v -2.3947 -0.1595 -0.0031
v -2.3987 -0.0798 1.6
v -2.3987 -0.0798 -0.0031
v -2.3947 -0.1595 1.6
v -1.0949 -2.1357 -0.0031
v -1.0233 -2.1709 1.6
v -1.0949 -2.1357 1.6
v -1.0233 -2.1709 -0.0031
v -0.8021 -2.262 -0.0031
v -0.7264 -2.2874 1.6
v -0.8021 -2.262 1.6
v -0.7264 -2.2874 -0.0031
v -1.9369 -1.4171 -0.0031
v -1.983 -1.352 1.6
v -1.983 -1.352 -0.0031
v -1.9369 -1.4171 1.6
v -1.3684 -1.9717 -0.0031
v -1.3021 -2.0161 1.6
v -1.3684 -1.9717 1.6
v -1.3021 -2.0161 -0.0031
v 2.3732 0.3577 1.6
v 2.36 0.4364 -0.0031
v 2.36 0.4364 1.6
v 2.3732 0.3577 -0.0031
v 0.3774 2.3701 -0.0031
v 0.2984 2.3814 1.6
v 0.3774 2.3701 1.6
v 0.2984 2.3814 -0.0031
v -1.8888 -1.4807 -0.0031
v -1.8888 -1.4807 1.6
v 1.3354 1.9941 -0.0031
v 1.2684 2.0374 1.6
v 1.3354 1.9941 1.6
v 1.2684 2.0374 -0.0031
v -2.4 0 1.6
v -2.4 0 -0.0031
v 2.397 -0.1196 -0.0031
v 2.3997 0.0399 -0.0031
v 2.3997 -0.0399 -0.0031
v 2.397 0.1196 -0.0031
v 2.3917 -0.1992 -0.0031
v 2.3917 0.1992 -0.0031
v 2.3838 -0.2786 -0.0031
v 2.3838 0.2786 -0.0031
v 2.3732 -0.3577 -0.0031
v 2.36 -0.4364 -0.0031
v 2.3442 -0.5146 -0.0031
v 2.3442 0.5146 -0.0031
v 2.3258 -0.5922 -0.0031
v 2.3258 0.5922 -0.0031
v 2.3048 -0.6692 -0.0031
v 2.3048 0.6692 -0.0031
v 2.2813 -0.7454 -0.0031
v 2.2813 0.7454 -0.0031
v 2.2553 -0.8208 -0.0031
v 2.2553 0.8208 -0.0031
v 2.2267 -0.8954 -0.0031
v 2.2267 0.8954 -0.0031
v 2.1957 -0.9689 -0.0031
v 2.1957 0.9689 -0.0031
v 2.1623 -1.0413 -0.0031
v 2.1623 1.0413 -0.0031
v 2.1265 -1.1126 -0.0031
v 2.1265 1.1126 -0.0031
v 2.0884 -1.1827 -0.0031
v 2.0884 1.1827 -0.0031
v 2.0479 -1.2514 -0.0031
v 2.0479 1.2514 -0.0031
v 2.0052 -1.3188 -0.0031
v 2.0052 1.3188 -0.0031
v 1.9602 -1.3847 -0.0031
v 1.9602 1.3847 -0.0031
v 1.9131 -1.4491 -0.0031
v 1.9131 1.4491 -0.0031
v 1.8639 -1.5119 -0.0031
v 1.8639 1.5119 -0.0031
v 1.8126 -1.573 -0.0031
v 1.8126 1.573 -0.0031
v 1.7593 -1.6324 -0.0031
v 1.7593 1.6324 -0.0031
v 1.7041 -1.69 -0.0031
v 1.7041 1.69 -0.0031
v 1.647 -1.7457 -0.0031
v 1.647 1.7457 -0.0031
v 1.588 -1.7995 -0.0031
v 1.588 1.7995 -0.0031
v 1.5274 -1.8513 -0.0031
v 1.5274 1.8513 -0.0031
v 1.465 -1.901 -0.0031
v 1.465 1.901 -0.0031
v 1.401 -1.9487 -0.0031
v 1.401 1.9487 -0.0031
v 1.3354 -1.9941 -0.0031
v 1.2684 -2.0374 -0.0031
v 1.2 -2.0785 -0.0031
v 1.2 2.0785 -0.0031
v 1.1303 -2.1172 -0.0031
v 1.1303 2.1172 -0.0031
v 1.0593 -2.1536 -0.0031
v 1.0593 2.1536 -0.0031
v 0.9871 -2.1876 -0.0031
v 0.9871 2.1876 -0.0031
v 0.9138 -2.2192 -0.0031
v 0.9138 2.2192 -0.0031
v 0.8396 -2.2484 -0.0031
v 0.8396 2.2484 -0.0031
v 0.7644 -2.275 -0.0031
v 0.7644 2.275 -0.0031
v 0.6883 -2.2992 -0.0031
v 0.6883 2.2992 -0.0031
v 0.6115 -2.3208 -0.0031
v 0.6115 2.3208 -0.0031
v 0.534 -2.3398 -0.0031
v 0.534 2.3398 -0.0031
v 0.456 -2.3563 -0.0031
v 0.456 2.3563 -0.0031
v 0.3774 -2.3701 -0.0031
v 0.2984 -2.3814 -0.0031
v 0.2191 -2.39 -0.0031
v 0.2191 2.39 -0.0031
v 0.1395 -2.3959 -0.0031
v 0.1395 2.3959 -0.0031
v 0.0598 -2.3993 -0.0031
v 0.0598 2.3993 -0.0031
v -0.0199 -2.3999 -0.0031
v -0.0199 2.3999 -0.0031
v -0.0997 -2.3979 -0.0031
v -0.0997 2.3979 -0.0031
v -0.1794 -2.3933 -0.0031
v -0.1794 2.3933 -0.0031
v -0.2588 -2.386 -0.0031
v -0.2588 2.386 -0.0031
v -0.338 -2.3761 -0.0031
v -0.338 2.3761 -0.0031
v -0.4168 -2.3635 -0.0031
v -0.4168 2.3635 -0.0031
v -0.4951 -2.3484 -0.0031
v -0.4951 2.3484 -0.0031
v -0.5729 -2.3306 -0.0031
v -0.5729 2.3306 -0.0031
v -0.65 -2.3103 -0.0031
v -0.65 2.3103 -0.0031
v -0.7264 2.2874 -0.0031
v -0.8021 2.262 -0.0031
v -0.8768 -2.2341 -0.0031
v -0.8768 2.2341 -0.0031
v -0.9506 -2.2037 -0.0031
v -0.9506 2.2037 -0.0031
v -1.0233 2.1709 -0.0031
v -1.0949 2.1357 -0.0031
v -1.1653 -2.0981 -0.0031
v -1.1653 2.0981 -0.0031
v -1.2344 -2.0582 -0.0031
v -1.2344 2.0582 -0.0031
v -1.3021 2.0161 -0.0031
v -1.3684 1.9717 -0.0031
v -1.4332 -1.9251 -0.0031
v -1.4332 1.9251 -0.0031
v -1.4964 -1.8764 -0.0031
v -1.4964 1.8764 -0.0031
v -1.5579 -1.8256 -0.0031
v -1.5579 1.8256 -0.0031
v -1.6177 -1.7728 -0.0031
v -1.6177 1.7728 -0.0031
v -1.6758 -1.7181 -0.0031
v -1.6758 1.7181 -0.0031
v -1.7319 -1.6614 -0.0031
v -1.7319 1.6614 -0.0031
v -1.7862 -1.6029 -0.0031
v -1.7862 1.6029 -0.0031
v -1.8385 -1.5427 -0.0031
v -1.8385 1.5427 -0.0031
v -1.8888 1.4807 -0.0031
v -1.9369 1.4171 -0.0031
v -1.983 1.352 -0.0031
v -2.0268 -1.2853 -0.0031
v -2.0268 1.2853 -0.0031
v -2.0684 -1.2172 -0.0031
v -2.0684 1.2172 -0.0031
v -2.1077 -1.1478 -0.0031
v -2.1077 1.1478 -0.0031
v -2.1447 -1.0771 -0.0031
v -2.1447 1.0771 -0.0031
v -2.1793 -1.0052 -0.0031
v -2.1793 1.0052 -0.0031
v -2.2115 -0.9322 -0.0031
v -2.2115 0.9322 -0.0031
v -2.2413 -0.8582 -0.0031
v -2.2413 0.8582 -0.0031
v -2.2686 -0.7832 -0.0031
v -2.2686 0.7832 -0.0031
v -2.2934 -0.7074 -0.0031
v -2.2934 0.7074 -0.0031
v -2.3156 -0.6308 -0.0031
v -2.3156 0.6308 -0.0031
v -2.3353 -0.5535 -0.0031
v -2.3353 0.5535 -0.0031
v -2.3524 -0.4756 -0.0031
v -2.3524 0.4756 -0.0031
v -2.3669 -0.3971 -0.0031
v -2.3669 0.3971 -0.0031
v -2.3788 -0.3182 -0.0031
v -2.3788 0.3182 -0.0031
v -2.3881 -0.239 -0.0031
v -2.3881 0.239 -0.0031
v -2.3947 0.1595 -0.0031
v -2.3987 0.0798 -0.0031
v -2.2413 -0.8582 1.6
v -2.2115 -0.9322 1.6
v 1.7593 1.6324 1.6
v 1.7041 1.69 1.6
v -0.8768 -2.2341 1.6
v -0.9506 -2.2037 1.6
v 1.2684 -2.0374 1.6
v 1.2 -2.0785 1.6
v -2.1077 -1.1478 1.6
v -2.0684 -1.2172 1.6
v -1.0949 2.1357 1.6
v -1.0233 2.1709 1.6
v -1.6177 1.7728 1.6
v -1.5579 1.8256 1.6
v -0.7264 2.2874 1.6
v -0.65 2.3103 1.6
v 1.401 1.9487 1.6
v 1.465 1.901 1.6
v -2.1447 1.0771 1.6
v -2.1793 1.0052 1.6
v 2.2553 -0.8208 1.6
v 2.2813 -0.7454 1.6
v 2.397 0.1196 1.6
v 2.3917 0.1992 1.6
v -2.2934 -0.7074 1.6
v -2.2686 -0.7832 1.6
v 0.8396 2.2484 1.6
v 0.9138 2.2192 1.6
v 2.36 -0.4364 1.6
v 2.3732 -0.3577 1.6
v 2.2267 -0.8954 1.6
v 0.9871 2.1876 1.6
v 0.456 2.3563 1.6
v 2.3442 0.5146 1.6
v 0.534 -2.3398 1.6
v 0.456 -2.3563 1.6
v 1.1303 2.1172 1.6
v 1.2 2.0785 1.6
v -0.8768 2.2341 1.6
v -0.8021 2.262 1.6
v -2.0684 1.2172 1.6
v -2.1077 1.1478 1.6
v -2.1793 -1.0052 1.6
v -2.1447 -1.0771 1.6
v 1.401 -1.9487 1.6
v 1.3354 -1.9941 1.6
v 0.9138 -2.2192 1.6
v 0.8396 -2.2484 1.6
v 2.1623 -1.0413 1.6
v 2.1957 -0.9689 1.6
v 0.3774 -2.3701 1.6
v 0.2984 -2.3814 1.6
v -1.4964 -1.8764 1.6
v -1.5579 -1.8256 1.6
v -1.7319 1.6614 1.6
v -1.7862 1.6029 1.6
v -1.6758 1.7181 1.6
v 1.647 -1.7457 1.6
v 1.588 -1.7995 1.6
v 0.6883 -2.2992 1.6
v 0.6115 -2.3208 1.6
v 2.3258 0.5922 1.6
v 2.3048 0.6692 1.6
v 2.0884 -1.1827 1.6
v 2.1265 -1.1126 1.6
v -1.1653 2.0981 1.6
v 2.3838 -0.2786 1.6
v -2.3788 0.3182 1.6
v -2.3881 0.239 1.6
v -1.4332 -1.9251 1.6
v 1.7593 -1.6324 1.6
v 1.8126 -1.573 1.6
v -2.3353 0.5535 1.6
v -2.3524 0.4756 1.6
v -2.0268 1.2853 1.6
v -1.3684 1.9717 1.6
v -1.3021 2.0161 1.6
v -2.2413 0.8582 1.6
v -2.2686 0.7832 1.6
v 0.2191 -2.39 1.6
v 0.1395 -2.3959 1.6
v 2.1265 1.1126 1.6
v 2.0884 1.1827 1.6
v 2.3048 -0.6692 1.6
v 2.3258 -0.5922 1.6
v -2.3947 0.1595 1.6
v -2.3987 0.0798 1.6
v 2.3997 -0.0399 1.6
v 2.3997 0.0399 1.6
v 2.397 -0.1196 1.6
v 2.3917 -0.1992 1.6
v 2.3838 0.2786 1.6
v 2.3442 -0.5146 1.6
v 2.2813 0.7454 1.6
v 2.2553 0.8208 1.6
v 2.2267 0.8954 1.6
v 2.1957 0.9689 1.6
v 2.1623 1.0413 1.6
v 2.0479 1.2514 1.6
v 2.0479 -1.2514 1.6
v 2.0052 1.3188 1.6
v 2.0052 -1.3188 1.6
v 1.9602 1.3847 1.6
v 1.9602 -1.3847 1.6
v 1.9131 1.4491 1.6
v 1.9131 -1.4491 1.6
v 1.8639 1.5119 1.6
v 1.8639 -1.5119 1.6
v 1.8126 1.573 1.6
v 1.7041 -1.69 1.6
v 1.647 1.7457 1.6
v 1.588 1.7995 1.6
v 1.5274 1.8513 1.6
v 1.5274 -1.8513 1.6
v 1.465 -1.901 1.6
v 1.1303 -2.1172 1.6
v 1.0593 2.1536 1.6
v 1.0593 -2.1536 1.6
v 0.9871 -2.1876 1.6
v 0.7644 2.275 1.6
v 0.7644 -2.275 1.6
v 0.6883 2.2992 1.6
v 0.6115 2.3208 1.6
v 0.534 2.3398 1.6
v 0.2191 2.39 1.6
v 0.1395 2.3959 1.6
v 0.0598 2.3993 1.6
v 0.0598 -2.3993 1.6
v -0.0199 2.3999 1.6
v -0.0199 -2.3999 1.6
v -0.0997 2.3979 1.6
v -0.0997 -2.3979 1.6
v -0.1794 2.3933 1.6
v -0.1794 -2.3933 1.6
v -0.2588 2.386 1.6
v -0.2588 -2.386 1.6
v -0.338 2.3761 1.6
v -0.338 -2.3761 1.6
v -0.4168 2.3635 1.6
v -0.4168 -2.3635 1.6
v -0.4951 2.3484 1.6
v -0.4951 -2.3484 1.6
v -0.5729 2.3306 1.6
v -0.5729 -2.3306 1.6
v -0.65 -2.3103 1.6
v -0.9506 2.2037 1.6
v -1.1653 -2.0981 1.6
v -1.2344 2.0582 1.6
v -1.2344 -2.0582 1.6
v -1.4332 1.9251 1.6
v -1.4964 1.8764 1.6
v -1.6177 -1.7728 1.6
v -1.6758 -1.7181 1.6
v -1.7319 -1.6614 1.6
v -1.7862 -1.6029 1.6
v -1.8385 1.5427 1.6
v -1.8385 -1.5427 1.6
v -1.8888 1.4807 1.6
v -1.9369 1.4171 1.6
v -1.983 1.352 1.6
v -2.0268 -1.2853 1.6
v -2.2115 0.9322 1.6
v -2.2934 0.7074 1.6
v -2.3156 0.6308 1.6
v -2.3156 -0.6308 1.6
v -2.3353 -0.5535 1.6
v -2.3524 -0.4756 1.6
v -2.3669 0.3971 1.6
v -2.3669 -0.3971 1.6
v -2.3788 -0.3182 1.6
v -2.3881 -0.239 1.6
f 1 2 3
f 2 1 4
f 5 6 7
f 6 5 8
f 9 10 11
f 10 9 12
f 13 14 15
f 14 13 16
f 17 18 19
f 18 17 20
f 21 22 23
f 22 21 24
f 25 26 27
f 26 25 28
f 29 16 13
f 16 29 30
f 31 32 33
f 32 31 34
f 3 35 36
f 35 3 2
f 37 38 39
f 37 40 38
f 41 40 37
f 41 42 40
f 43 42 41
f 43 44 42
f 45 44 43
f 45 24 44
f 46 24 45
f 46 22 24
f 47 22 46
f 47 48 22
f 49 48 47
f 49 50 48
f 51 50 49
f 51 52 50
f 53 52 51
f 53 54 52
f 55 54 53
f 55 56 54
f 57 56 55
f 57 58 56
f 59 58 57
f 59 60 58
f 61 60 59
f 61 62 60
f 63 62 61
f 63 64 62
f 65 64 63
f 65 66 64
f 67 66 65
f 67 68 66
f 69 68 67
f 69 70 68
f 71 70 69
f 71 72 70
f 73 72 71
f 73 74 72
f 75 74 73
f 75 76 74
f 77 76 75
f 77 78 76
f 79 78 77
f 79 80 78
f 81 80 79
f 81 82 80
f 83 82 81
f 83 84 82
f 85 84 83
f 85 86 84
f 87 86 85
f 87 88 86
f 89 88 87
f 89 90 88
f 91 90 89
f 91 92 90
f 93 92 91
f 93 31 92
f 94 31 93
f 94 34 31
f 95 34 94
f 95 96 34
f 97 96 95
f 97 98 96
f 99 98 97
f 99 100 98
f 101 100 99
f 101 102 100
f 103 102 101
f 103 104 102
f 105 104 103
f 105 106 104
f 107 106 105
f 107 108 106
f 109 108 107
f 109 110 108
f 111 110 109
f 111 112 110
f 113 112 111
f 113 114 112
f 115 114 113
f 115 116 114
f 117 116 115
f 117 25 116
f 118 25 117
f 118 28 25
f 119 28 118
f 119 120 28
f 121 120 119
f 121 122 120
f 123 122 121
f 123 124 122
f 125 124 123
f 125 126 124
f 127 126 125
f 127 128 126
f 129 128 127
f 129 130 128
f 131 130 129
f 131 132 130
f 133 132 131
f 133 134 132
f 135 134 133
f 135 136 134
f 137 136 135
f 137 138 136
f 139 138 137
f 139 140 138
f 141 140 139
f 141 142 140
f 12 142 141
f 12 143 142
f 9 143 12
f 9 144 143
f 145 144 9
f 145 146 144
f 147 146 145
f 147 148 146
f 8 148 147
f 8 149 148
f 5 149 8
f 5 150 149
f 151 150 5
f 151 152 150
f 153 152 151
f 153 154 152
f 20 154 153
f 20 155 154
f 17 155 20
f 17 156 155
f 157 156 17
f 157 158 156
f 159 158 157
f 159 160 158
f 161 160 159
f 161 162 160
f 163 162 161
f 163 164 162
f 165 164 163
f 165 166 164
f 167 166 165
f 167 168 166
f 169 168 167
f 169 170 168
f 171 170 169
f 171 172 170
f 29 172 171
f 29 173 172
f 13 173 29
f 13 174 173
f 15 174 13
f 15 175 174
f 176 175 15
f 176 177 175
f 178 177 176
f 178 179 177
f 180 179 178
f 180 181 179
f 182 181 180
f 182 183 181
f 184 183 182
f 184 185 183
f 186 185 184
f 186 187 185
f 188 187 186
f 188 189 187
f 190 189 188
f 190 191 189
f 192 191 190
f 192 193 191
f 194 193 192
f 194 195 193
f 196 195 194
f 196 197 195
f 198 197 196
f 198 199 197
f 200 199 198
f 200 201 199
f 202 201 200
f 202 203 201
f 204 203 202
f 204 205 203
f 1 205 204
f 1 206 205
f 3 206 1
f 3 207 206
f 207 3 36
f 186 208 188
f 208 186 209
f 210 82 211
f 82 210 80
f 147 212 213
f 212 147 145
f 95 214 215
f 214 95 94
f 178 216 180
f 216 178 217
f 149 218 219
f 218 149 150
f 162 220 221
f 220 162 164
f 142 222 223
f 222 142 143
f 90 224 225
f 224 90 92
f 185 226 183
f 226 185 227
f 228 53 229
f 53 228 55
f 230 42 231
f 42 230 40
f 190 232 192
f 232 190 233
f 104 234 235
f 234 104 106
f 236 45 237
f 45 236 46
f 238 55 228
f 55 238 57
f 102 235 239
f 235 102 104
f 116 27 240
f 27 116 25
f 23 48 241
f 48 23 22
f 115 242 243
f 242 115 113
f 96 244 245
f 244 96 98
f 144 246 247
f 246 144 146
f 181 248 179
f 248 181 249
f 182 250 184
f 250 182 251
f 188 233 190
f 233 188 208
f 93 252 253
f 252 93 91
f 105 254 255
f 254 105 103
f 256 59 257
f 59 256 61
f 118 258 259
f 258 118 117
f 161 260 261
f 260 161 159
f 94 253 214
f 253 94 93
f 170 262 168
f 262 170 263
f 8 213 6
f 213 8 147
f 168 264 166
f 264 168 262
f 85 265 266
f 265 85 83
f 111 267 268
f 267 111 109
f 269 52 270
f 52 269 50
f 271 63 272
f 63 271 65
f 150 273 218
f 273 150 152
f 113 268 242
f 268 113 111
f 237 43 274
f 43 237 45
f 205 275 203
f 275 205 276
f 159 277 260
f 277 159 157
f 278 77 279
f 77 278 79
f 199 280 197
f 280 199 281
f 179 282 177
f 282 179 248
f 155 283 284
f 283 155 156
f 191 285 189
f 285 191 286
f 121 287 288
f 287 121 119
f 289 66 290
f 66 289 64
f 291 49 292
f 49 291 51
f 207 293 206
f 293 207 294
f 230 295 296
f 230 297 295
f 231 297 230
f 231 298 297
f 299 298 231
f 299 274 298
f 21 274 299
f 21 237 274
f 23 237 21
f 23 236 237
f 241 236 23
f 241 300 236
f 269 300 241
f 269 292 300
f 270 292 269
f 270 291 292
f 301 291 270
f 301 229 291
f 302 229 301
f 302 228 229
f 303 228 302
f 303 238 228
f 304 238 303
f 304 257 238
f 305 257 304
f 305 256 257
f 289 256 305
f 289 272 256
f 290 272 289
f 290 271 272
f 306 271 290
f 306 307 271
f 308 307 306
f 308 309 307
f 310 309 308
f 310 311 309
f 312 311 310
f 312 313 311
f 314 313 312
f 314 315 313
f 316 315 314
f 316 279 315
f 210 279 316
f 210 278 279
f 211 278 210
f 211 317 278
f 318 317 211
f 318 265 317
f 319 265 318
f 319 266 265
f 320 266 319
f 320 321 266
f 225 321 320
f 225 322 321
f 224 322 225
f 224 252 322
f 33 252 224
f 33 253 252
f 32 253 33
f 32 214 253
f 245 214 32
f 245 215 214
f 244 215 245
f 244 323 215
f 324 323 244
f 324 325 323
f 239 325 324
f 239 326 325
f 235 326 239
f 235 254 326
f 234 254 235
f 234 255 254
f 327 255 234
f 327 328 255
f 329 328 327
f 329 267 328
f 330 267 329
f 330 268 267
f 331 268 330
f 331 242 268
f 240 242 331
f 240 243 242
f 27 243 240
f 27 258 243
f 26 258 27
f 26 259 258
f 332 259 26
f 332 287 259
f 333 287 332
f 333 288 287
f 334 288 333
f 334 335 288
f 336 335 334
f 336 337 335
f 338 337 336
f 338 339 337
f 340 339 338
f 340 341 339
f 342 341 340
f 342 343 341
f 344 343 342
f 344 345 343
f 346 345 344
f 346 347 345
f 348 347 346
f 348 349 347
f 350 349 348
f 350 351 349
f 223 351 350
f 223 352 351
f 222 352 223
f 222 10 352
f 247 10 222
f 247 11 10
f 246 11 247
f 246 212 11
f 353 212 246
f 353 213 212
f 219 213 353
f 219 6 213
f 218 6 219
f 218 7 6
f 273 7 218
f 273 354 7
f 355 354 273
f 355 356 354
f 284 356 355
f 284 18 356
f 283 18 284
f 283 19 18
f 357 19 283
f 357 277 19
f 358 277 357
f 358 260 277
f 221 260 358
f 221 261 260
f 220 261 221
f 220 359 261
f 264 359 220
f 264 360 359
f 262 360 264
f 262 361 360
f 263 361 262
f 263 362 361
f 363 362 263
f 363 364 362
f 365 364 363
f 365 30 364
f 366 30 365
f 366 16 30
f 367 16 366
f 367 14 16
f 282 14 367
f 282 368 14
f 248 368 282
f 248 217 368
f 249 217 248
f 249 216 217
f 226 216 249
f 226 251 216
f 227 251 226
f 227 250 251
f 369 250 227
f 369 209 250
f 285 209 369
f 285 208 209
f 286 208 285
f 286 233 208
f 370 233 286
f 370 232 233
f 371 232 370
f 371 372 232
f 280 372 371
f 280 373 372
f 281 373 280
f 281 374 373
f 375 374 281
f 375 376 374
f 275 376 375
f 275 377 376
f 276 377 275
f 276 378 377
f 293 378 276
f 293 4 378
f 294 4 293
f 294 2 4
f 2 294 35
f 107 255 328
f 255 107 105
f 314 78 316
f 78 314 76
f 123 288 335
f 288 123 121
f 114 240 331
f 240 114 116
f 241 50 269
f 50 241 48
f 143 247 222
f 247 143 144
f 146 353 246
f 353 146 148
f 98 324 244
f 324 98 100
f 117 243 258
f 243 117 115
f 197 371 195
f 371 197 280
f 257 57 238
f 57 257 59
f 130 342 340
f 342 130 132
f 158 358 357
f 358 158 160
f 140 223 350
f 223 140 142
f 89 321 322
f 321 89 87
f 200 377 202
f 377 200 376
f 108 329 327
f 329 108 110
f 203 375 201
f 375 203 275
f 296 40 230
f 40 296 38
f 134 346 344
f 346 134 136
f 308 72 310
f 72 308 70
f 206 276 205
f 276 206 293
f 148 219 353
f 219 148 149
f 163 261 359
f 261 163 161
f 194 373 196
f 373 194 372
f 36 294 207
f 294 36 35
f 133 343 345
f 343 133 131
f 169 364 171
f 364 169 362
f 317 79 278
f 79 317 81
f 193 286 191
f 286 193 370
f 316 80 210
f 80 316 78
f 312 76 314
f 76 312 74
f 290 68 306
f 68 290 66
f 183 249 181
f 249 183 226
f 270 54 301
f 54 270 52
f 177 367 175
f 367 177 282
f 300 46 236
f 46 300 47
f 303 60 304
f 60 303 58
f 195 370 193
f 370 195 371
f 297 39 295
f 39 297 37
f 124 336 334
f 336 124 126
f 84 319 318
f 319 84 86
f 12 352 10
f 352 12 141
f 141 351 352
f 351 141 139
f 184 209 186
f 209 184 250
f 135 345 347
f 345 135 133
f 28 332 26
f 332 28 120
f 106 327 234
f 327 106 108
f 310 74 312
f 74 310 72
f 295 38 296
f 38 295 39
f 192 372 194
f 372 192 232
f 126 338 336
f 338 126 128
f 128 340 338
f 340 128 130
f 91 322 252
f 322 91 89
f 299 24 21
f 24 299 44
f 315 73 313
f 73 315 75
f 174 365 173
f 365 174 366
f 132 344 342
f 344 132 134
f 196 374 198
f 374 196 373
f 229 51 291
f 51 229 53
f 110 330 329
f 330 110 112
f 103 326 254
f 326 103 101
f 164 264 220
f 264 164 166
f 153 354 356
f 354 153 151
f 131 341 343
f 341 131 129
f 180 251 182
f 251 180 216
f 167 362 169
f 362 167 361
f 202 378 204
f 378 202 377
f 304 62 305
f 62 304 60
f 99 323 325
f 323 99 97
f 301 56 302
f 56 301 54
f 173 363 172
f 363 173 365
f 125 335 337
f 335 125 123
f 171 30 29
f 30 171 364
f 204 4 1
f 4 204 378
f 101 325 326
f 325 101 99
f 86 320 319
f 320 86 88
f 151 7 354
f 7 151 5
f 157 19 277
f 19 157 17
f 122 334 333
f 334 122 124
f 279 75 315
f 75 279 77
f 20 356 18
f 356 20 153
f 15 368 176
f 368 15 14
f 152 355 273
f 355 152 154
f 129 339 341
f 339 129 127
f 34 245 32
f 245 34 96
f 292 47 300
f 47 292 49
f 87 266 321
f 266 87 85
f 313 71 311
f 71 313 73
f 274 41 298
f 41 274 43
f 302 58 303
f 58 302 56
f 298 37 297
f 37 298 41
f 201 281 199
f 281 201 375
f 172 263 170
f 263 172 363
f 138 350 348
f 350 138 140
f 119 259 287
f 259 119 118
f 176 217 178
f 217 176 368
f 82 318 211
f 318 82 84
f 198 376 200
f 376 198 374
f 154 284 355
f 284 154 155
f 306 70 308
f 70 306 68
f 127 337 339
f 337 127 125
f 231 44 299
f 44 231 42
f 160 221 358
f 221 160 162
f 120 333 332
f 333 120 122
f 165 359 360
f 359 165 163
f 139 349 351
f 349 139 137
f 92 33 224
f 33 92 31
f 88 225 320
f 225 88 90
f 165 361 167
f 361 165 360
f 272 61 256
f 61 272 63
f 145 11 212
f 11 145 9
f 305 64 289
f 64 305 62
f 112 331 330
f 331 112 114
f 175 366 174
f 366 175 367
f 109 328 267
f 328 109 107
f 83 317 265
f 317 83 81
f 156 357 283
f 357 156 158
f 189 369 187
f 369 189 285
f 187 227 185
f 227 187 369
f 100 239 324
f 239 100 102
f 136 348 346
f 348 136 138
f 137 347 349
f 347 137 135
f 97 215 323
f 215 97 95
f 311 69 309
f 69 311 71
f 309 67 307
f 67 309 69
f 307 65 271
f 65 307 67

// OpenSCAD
// file: ../p/stud3.scad
use <../lib.scad>
use <4-4cyli.scad>
use <4-4disc.scad>
use <4-4edge.scad>
$fa=1; $fs=0.2;
function ldraw_lib__stud3(realsolid=false) = realsolid ? 
    [openscad(translate([0,0,-eps()], o=cylinder(4+eps(), r=4)),2)] : [
// 0 Stud Tube Solid
// 0 Name: stud3.dat
// 0 Author: James Jessiman
// 0 !LDRAW_ORG Primitive UPDATE 2012-01
// 0 !LICENSE Licensed under CC BY 2.0 and CC BY 4.0 : see CAreadme.txt
// 
// 0 BFC CERTIFY CCW
  [0,"BFC","CERTIFY"],
  [0,"BFC","CCW"],
// 
// 0 !HISTORY 2002-04-04 [sbliss] Modified for BFC compliance
// 0 !HISTORY 2002-04-25 [PTadmin] Official Update 2002-02
// 0 !HISTORY 2007-06-24 [PTadmin] Header formatted for Contributor Agreement
// 0 !HISTORY 2008-07-01 [PTadmin] Official Update 2008-01
// 0 !HISTORY 2012-02-16 [Philo] Changed to CCW
// 0 !HISTORY 2012-03-30 [PTadmin] Official Update 2012-01
// 
// 
// 1 16 0 -4 0 4 0 0 0 1 0 0 0 4 4-4edge.dat
  [1,16,0,-4,0,4,0,0,0,1,0,0,0,4, ldraw_lib__4_4edge(realsolid)],
// 1 16 0 0 0 4 0 0 0 1 0 0 0 4 4-4edge.dat
  [1,16,0,0,0,4,0,0,0,1,0,0,0,4, ldraw_lib__4_4edge(realsolid)],
// 1 16 0 -4 0 4 0 0 0 1 0 0 0 4 4-4disc.dat
  [1,16,0,-4,0,4,0,0,0,1,0,0,0,4, ldraw_lib__4_4disc(realsolid)],
// 1 16 0 -4 0 4 0 0 0 4 0 0 0 4 4-4cyli.dat
  [1,16,0,-4,0,4,0,0,0,4,0,0,0,4, ldraw_lib__4_4cyli(realsolid)],
];
module ldraw_lib__stud3(step=0, col=false, unit=2/5, alt=false, line=0.2, solid=!$preview)
    makepoly(ldraw_lib__stud3(solid), step=step, col=col, unit=unit, alt=alt, line=line, solid=solid);
ldraw_lib__stud3(line=0.2);
// file: ../p/4-4edge.scad
use <../lib.scad>
$fa=1; $fs=0.2;
function ldraw_lib__4_4edge(realsolid=false) = [
// 0 Circle 1.0
// 0 Name: 4-4edge.dat
// 0 Author: James Jessiman
// 0 !LDRAW_ORG Primitive UPDATE 2017-01
// 0 !LICENSE Licensed under CC BY 2.0 and CC BY 4.0 : see CAreadme.txt
// 
// 0 BFC CERTIFY CCW
  [0,"BFC","CERTIFY"],
  [0,"BFC","CCW"],
// 
// 0 !HISTORY 1998-12-15 [PTadmin] Official Update 1998-10
// 0 !HISTORY 2005-12-28 [PTadmin] Official Update 2005-01
// 0 !HISTORY 2007-06-24 [PTadmin] Header formatted for Contributor Agreement
// 0 !HISTORY 2008-07-01 [PTadmin] Official Update 2008-01
// 0 !HISTORY 2017-01-15 [Steffen] BFCed
// 0 !HISTORY 2017-12-30 [PTadmin] Official Update 2017-01
// 
// 
// 2 24 1 0 0 0.9239 0 0.3827
  [2,24,1,0,0,0.9239,0,0.3827],
// 2 24 0.9239 0 0.3827 0.7071 0 0.7071
  [2,24,0.9239,0,0.3827,0.7071,0,0.7071],
// 2 24 0.7071 0 0.7071 0.3827 0 0.9239
  [2,24,0.7071,0,0.7071,0.3827,0,0.9239],
// 2 24 0.3827 0 0.9239 0 0 1
  [2,24,0.3827,0,0.9239,0,0,1],
// 2 24 0 0 1 -0.3827 0 0.9239
  [2,24,0,0,1,-0.3827,0,0.9239],
// 2 24 -0.3827 0 0.9239 -0.7071 0 0.7071
  [2,24,-0.3827,0,0.9239,-0.7071,0,0.7071],
// 2 24 -0.7071 0 0.7071 -0.9239 0 0.3827
  [2,24,-0.7071,0,0.7071,-0.9239,0,0.3827],
// 2 24 -0.9239 0 0.3827 -1 0 -0
  [2,24,-0.9239,0,0.3827,-1,0,-0],
// 2 24 -1 0 -0 -0.9239 0 -0.3827
  [2,24,-1,0,-0,-0.9239,0,-0.3827],
// 2 24 -0.9239 0 -0.3827 -0.7071 0 -0.7071
  [2,24,-0.9239,0,-0.3827,-0.7071,0,-0.7071],
// 2 24 -0.7071 0 -0.7071 -0.3827 0 -0.9239
  [2,24,-0.7071,0,-0.7071,-0.3827,0,-0.9239],
// 2 24 -0.3827 0 -0.9239 0 0 -1
  [2,24,-0.3827,0,-0.9239,0,0,-1],
// 2 24 0 0 -1 0.3827 0 -0.9239
  [2,24,0,0,-1,0.3827,0,-0.9239],
// 2 24 0.3827 0 -0.9239 0.7071 0 -0.7071
  [2,24,0.3827,0,-0.9239,0.7071,0,-0.7071],
// 2 24 0.7071 0 -0.7071 0.9239 0 -0.3827
  [2,24,0.7071,0,-0.7071,0.9239,0,-0.3827],
// 2 24 0.9239 0 -0.3827 1 0 0
  [2,24,0.9239,0,-0.3827,1,0,0],
];
module ldraw_lib__4_4edge(step=0, col=false, unit=2/5, alt=false, line=0.2, solid=!$preview)
    makepoly(ldraw_lib__4_4edge(solid), step=step, col=col, unit=unit, alt=alt, line=line, solid=solid);
ldraw_lib__4_4edge(line=0.2);
// file: ../p/4-4disc.scad
use <../lib.scad>
$fa=1; $fs=0.2;
function ldraw_lib__4_4disc(realsolid=false) = [
// 0 Disc 1.0
// 0 Name: 4-4disc.dat
// 0 Author: James Jessiman
// 0 !LDRAW_ORG Primitive UPDATE 2002-02
// 0 !LICENSE Licensed under CC BY 2.0 and CC BY 4.0 : see CAreadme.txt
// 
// 0 BFC CERTIFY CCW
  [0,"BFC","CERTIFY"],
  [0,"BFC","CCW"],
// 
// 0 !HISTORY 1998-12-15 [PTadmin] Official Update 1998-10
// 0 !HISTORY 2002-03-23 [sbliss] Added BFC statement
// 0 !HISTORY 2002-04-25 [PTadmin] Official Update 2002-02
// 0 !HISTORY 2007-06-24 [PTadmin] Header formatted for Contributor Agreement
// 0 !HISTORY 2008-07-01 [PTadmin] Official Update 2008-01
// 
// 
// 3 16 0 0 0 1 0 0 0.9239 0 0.3827
  [3,16,0,0,0,1,0,0,0.9239,0,0.3827],
// 3 16 0 0 0 0.9239 0 0.3827 0.7071 0 0.7071
  [3,16,0,0,0,0.9239,0,0.3827,0.7071,0,0.7071],
// 3 16 0 0 0 0.7071 0 0.7071 0.3827 0 0.9239
  [3,16,0,0,0,0.7071,0,0.7071,0.3827,0,0.9239],
// 3 16 0 0 0 0.3827 0 0.9239 0 0 1
  [3,16,0,0,0,0.3827,0,0.9239,0,0,1],
// 3 16 0 0 0 0 0 1 -0.3827 0 0.9239
  [3,16,0,0,0,0,0,1,-0.3827,0,0.9239],
// 3 16 0 0 0 -0.3827 0 0.9239 -0.7071 0 0.7071
  [3,16,0,0,0,-0.3827,0,0.9239,-0.7071,0,0.7071],
// 3 16 0 0 0 -0.7071 0 0.7071 -0.9239 0 0.3827
  [3,16,0,0,0,-0.7071,0,0.7071,-0.9239,0,0.3827],
// 3 16 0 0 0 -0.9239 0 0.3827 -1 0 -0
  [3,16,0,0,0,-0.9239,0,0.3827,-1,0,-0],
// 3 16 0 0 0 -1 0 -0 -0.9239 0 -0.3827
  [3,16,0,0,0,-1,0,-0,-0.9239,0,-0.3827],
// 3 16 0 0 0 -0.9239 0 -0.3827 -0.7071 0 -0.7071
  [3,16,0,0,0,-0.9239,0,-0.3827,-0.7071,0,-0.7071],
// 3 16 0 0 0 -0.7071 0 -0.7071 -0.3827 0 -0.9239
  [3,16,0,0,0,-0.7071,0,-0.7071,-0.3827,0,-0.9239],
// 3 16 0 0 0 -0.3827 0 -0.9239 0 0 -1
  [3,16,0,0,0,-0.3827,0,-0.9239,0,0,-1],
// 3 16 0 0 0 0 0 -1 0.3827 0 -0.9239
  [3,16,0,0,0,0,0,-1,0.3827,0,-0.9239],
// 3 16 0 0 0 0.3827 0 -0.9239 0.7071 0 -0.7071
  [3,16,0,0,0,0.3827,0,-0.9239,0.7071,0,-0.7071],
// 3 16 0 0 0 0.7071 0 -0.7071 0.9239 0 -0.3827
  [3,16,0,0,0,0.7071,0,-0.7071,0.9239,0,-0.3827],
// 3 16 0 0 0 0.9239 0 -0.3827 1 0 0
  [3,16,0,0,0,0.9239,0,-0.3827,1,0,0],
// 0
];
module ldraw_lib__4_4disc(step=0, col=false, unit=2/5, alt=false, line=0.2, solid=!$preview)
    makepoly(ldraw_lib__4_4disc(solid), step=step, col=col, unit=unit, alt=alt, line=line, solid=solid);
ldraw_lib__4_4disc(line=0.2);
// file: ../p/4-4cyli.scad
use <../lib.scad>
$fa=1; $fs=0.2;
function ldraw_lib__4_4cyli(realsolid=false) = [
// 0 Cylinder 1.0
// 0 Name: 4-4cyli.dat
// 0 Author: James Jessiman
// 0 !LDRAW_ORG Primitive UPDATE 2005-01
// 0 !LICENSE Licensed under CC BY 2.0 and CC BY 4.0 : see CAreadme.txt
// 
// 0 BFC CERTIFY CCW
  [0,"BFC","CERTIFY"],
  [0,"BFC","CCW"],
// 
// 0 !HISTORY 1998-12-15 [PTadmin] Official Update 1998-10
// 0 !HISTORY 2002-03-23 [sbliss] Added BFC statement; merged headers from files in distributions LDraw 0.27 and Complete.
// 0 !HISTORY 2002-04-25 [PTadmin] Official Update 2002-02
// 0 !HISTORY 2004-12-14 [guyvivan] BFC CCW
// 0 !HISTORY 2005-12-28 [PTadmin] Official Update 2005-01
// 0 !HISTORY 2007-06-24 [PTadmin] Header formatted for Contributor Agreement
// 0 !HISTORY 2008-07-01 [PTadmin] Official Update 2008-01
// 
// 
// 4 16 1 1 0 0.9239 1 0.3827 0.9239 0 0.3827 1 0 0
  [4,16,1,1,0,0.9239,1,0.3827,0.9239,0,0.3827,1,0,0],
// 5 24 1 0 0 1 1 0 0.9239 0 0.3827 0.9239 0 -0.3827
  [5,24,1,0,0,1,1,0,0.9239,0,0.3827,0.9239,0,-0.3827],
// 4 16 0.9239 1 0.3827 0.7071 1 0.7071 0.7071 0 0.7071 0.9239 0 0.3827
  [4,16,0.9239,1,0.3827,0.7071,1,0.7071,0.7071,0,0.7071,0.9239,0,0.3827],
// 5 24 0.9239 0 0.3827 0.9239 1 0.3827 0.7071 0 0.7071 1 0 0
  [5,24,0.9239,0,0.3827,0.9239,1,0.3827,0.7071,0,0.7071,1,0,0],
// 4 16 0.7071 1 0.7071 0.3827 1 0.9239 0.3827 0 0.9239 0.7071 0 0.7071
  [4,16,0.7071,1,0.7071,0.3827,1,0.9239,0.3827,0,0.9239,0.7071,0,0.7071],
// 5 24 0.7071 0 0.7071 0.7071 1 0.7071 0.3827 0 0.9239 0.9239 0 0.3827
  [5,24,0.7071,0,0.7071,0.7071,1,0.7071,0.3827,0,0.9239,0.9239,0,0.3827],
// 4 16 0.3827 1 0.9239 0 1 1 0 0 1 0.3827 0 0.9239
  [4,16,0.3827,1,0.9239,0,1,1,0,0,1,0.3827,0,0.9239],
// 5 24 0.3827 0 0.9239 0.3827 1 0.9239 0 0 1 0.7071 0 0.7071
  [5,24,0.3827,0,0.9239,0.3827,1,0.9239,0,0,1,0.7071,0,0.7071],
// 4 16 0 1 1 -0.3827 1 0.9239 -0.3827 0 0.9239 0 0 1
  [4,16,0,1,1,-0.3827,1,0.9239,-0.3827,0,0.9239,0,0,1],
// 5 24 0 0 1 0 1 1 -0.3827 0 0.9239 0.3827 0 0.9239
  [5,24,0,0,1,0,1,1,-0.3827,0,0.9239,0.3827,0,0.9239],
// 4 16 -0.3827 1 0.9239 -0.7071 1 0.7071 -0.7071 0 0.7071 -0.3827 0 0.9239
  [4,16,-0.3827,1,0.9239,-0.7071,1,0.7071,-0.7071,0,0.7071,-0.3827,0,0.9239],
// 5 24 -0.3827 0 0.9239 -0.3827 1 0.9239 -0.7071 0 0.7071 0 0 1
  [5,24,-0.3827,0,0.9239,-0.3827,1,0.9239,-0.7071,0,0.7071,0,0,1],
// 4 16 -0.7071 1 0.7071 -0.9239 1 0.3827 -0.9239 0 0.3827 -0.7071 0 0.7071
  [4,16,-0.7071,1,0.7071,-0.9239,1,0.3827,-0.9239,0,0.3827,-0.7071,0,0.7071],
// 5 24 -0.7071 0 0.7071 -0.7071 1 0.7071 -0.9239 0 0.3827 -0.3827 0 0.9239
  [5,24,-0.7071,0,0.7071,-0.7071,1,0.7071,-0.9239,0,0.3827,-0.3827,0,0.9239],
// 4 16 -0.9239 1 0.3827 -1 1 0 -1 0 0 -0.9239 0 0.3827
  [4,16,-0.9239,1,0.3827,-1,1,0,-1,0,0,-0.9239,0,0.3827],
// 5 24 -0.9239 0 0.3827 -0.9239 1 0.3827 -1 0 0 -0.7071 0 0.7071
  [5,24,-0.9239,0,0.3827,-0.9239,1,0.3827,-1,0,0,-0.7071,0,0.7071],
// 4 16 -1 1 0 -0.9239 1 -0.3827 -0.9239 0 -0.3827 -1 0 0
  [4,16,-1,1,0,-0.9239,1,-0.3827,-0.9239,0,-0.3827,-1,0,0],
// 5 24 -1 0 0 -1 1 0 -0.9239 0 -0.3827 -0.9239 0 0.3827
  [5,24,-1,0,0,-1,1,0,-0.9239,0,-0.3827,-0.9239,0,0.3827],
// 4 16 -0.9239 1 -0.3827 -0.7071 1 -0.7071 -0.7071 0 -0.7071 -0.9239 0 -0.3827
  [4,16,-0.9239,1,-0.3827,-0.7071,1,-0.7071,-0.7071,0,-0.7071,-0.9239,0,-0.3827],
// 5 24 -0.9239 0 -0.3827 -0.9239 1 -0.3827 -0.7071 0 -0.7071 -1 0 0
  [5,24,-0.9239,0,-0.3827,-0.9239,1,-0.3827,-0.7071,0,-0.7071,-1,0,0],
// 4 16 -0.7071 1 -0.7071 -0.3827 1 -0.9239 -0.3827 0 -0.9239 -0.7071 0 -0.7071
  [4,16,-0.7071,1,-0.7071,-0.3827,1,-0.9239,-0.3827,0,-0.9239,-0.7071,0,-0.7071],
// 5 24 -0.7071 0 -0.7071 -0.7071 1 -0.7071 -0.3827 0 -0.9239 -0.9239 0 -0.3827
  [5,24,-0.7071,0,-0.7071,-0.7071,1,-0.7071,-0.3827,0,-0.9239,-0.9239,0,-0.3827],
// 4 16 -0.3827 1 -0.9239 0 1 -1 0 0 -1 -0.3827 0 -0.9239
  [4,16,-0.3827,1,-0.9239,0,1,-1,0,0,-1,-0.3827,0,-0.9239],
// 5 24 -0.3827 0 -0.9239 -0.3827 1 -0.9239 0 0 -1 -0.7071 0 -0.7071
  [5,24,-0.3827,0,-0.9239,-0.3827,1,-0.9239,0,0,-1,-0.7071,0,-0.7071],
// 4 16 0 1 -1 0.3827 1 -0.9239 0.3827 0 -0.9239 0 0 -1
  [4,16,0,1,-1,0.3827,1,-0.9239,0.3827,0,-0.9239,0,0,-1],
// 5 24 0 0 -1 0 1 -1 0.3827 0 -0.9239 -0.3827 0 -0.9239
  [5,24,0,0,-1,0,1,-1,0.3827,0,-0.9239,-0.3827,0,-0.9239],
// 4 16 0.3827 1 -0.9239 0.7071 1 -0.7071 0.7071 0 -0.7071 0.3827 0 -0.9239
  [4,16,0.3827,1,-0.9239,0.7071,1,-0.7071,0.7071,0,-0.7071,0.3827,0,-0.9239],
// 5 24 0.3827 0 -0.9239 0.3827 1 -0.9239 0.7071 0 -0.7071 0 0 -1
  [5,24,0.3827,0,-0.9239,0.3827,1,-0.9239,0.7071,0,-0.7071,0,0,-1],
// 4 16 0.7071 1 -0.7071 0.9239 1 -0.3827 0.9239 0 -0.3827 0.7071 0 -0.7071
  [4,16,0.7071,1,-0.7071,0.9239,1,-0.3827,0.9239,0,-0.3827,0.7071,0,-0.7071],
// 5 24 0.7071 0 -0.7071 0.7071 1 -0.7071 0.9239 0 -0.3827 0.3827 0 -0.9239
  [5,24,0.7071,0,-0.7071,0.7071,1,-0.7071,0.9239,0,-0.3827,0.3827,0,-0.9239],
// 4 16 0.9239 1 -0.3827 1 1 0 1 0 0 0.9239 0 -0.3827
  [4,16,0.9239,1,-0.3827,1,1,0,1,0,0,0.9239,0,-0.3827],
// 5 24 0.9239 0 -0.3827 0.9239 1 -0.3827 1 0 0 0.7071 0 -0.7071
  [5,24,0.9239,0,-0.3827,0.9239,1,-0.3827,1,0,0,0.7071,0,-0.7071],
// 0
];
module ldraw_lib__4_4cyli(step=0, col=false, unit=2/5, alt=false, line=0.2, solid=!$preview)
    makepoly(ldraw_lib__4_4cyli(solid), step=step, col=col, unit=unit, alt=alt, line=line, solid=solid);
ldraw_lib__4_4cyli(line=0.2);
// file: s/3004s01.scad
use <../../lib.scad>
use <../../p/box4t.scad>
use <../../p/box5.scad>
use <../../p/stud.scad>
use <../../p/stud3.scad>
$fa=1; $fs=0.2;
function ldraw_lib__s__3004s01(realsolid=false) = [
// 0 ~Brick  1 x  2 without Front Face
// 0 Name: s\3004s01.dat
// 0 Author: James Jessiman
// 0 !LDRAW_ORG Subpart UPDATE 2003-03
// 0 !LICENSE Licensed under CC BY 2.0 and CC BY 4.0 : see CAreadme.txt
// 
// 0 BFC CERTIFY CCW
  [0,"BFC","CERTIFY"],
  [0,"BFC","CCW"],
// 
// 0 !HISTORY 2003-09-07 [jriley] Subfiling, BFC
// 0 !HISTORY 2003-12-19 [PTadmin] Official Update 2003-03
// 0 !HISTORY 2007-08-29 [PTadmin] Header formatted for Contributor Agreement
// 0 !HISTORY 2008-07-01 [PTadmin] Official Update 2008-01
// 
// 
// 1 16 0 4 0 1 0 0 0 -5 0 0 0 1 stud3.dat
  [1,16,0,4,0,1,0,0,0,-5,0,0,0,1, ldraw_lib__stud3(realsolid)],
// 0 BFC INVERTNEXT
  [0,"BFC","INVERTNEXT"],
// 1 16 0 24 0 16 0 0 0 -20 0 0 0 6 box5.dat
  [1,16,0,24,0,16,0,0,0,-20,0,0,0,6, ldraw_lib__box5(realsolid)],
// 4 16 20 24 10 16 24 6 -16 24 6 -20 24 10
  [4,16,20,24,10,16,24,6,-16,24,6,-20,24,10],
// 4 16 -20 24 10 -16 24 6 -16 24 -6 -20 24 -10
  [4,16,-20,24,10,-16,24,6,-16,24,-6,-20,24,-10],
// 4 16 -20 24 -10 -16 24 -6 16 24 -6 20 24 -10
  [4,16,-20,24,-10,-16,24,-6,16,24,-6,20,24,-10],
// 4 16 20 24 -10 16 24 -6 16 24 6 20 24 10
  [4,16,20,24,-10,16,24,-6,16,24,6,20,24,10],
// 1 16 0 24 0 20 0 0 0 -24 0 0 0 10 box4t.dat
  [1,16,0,24,0,20,0,0,0,-24,0,0,0,10, ldraw_lib__box4t(realsolid)],
// 1 16 10 0 0 1 0 0 0 1 0 0 0 1 stud.dat
  [1,16,10,0,0,1,0,0,0,1,0,0,0,1, ldraw_lib__stud(realsolid)],
// 1 16 -10 0 0 1 0 0 0 1 0 0 0 1 stud.dat
  [1,16,-10,0,0,1,0,0,0,1,0,0,0,1, ldraw_lib__stud(realsolid)],
// 0
];
module ldraw_lib__s__3004s01(step=0, col=false, unit=2/5, alt=false, line=0.2, solid=!$preview)
    makepoly(ldraw_lib__s__3004s01(solid), step=step, col=col, unit=unit, alt=alt, line=line, solid=solid);
ldraw_lib__s__3004s01(line=0.2);
// file: ../p/stud.scad
use <../lib.scad>
use <4-4cyli.scad>
use <4-4disc.scad>
use <4-4edge.scad>
$fa=1; $fs=0.2;
function ldraw_lib__stud(realsolid=false) = realsolid ? 
    [openscad(translate([0,0,-eps()], o=cylinder(4+eps(), r=6)),2)] : [
// 0 Stud
// 0 Name: stud.dat
// 0 Author: James Jessiman
// 0 !LDRAW_ORG Primitive UPDATE 2012-01
// 0 !LICENSE Licensed under CC BY 2.0 and CC BY 4.0 : see CAreadme.txt
// 
// 0 BFC CERTIFY CCW
  [0,"BFC","CERTIFY"],
  [0,"BFC","CCW"],
// 
// 0 !HISTORY 2002-04-04 [sbliss] Modified for BFC compliance
// 0 !HISTORY 2002-04-25 [PTadmin] Official Update 2002-02
// 0 !HISTORY 2007-06-24 [PTadmin] Header formatted for Contributor Agreement
// 0 !HISTORY 2008-07-01 [PTadmin] Official Update 2008-01
// 0 !HISTORY 2012-02-16 [Philo] Changed to CCW
// 0 !HISTORY 2012-03-30 [PTadmin] Official Update 2012-01
// 
// 
// 1 16 0 0 0 6 0 0 0 1 0 0 0 6 4-4edge.dat
  [1,16,0,0,0,6,0,0,0,1,0,0,0,6, ldraw_lib__4_4edge(realsolid)],
// 1 16 0 -4 0 6 0 0 0 1 0 0 0 6 4-4edge.dat
  [1,16,0,-4,0,6,0,0,0,1,0,0,0,6, ldraw_lib__4_4edge(realsolid)],
// 1 16 0 0 0 6 0 0 0 -4 0 0 0 6 4-4cyli.dat
  [1,16,0,0,0,6,0,0,0,-4,0,0,0,6, ldraw_lib__4_4cyli(realsolid)],
// 1 16 0 -4 0 6 0 0 0 1 0 0 0 6 4-4disc.dat
  [1,16,0,-4,0,6,0,0,0,1,0,0,0,6, ldraw_lib__4_4disc(realsolid)],
];
module ldraw_lib__stud(step=0, col=false, unit=2/5, alt=false, line=0.2, solid=!$preview)
    makepoly(ldraw_lib__stud(solid), step=step, col=col, unit=unit, alt=alt, line=line, solid=solid);
ldraw_lib__stud(line=0.2);
// file: ../p/box5.scad
use <../lib.scad>
$fa=1; $fs=0.2;
function ldraw_lib__box5(realsolid=false) = [
// 0 Box with 5 Faces and All Edges
// 0 Name: box5.dat
// 0 Author: James Jessiman
// 0 !LDRAW_ORG Primitive UPDATE 2012-01
// 0 !LICENSE Licensed under CC BY 2.0 and CC BY 4.0 : see CAreadme.txt
// 
// 0 BFC CERTIFY CCW
  [0,"BFC","CERTIFY"],
  [0,"BFC","CCW"],
// 
// 0 !HISTORY 2002-04-03 [sbliss] Modified for BFC compliance
// 0 !HISTORY 2002-04-25 [PTadmin] Official Update 2002-02
// 0 !HISTORY 2007-06-24 [PTadmin] Header formatted for Contributor Agreement
// 0 !HISTORY 2008-07-01 [PTadmin] Official Update 2008-01
// 0 !HISTORY 2012-02-16 [Philo] Changed to CCW
// 0 !HISTORY 2012-03-30 [PTadmin] Official Update 2012-01
// 
// 
// 2 24 1 1 1 -1 1 1
  [2,24,1,1,1,-1,1,1],
// 2 24 -1 1 1 -1 1 -1
  [2,24,-1,1,1,-1,1,-1],
// 2 24 -1 1 -1 1 1 -1
  [2,24,-1,1,-1,1,1,-1],
// 2 24 1 1 -1 1 1 1
  [2,24,1,1,-1,1,1,1],
// 2 24 1 0 1 -1 0 1
  [2,24,1,0,1,-1,0,1],
// 2 24 -1 0 1 -1 0 -1
  [2,24,-1,0,1,-1,0,-1],
// 2 24 -1 0 -1 1 0 -1
  [2,24,-1,0,-1,1,0,-1],
// 2 24 1 0 -1 1 0 1
  [2,24,1,0,-1,1,0,1],
// 2 24 1 0 1 1 1 1
  [2,24,1,0,1,1,1,1],
// 2 24 -1 0 1 -1 1 1
  [2,24,-1,0,1,-1,1,1],
// 2 24 1 0 -1 1 1 -1
  [2,24,1,0,-1,1,1,-1],
// 2 24 -1 0 -1 -1 1 -1
  [2,24,-1,0,-1,-1,1,-1],
// 4 16 -1 1 1 1 1 1 1 1 -1 -1 1 -1
  [4,16,-1,1,1,1,1,1,1,1,-1,-1,1,-1],
// 4 16 -1 1 1 -1 0 1 1 0 1 1 1 1
  [4,16,-1,1,1,-1,0,1,1,0,1,1,1,1],
// 4 16 -1 1 -1 -1 0 -1 -1 0 1 -1 1 1
  [4,16,-1,1,-1,-1,0,-1,-1,0,1,-1,1,1],
// 4 16 1 1 -1 1 0 -1 -1 0 -1 -1 1 -1
  [4,16,1,1,-1,1,0,-1,-1,0,-1,-1,1,-1],
// 4 16 1 1 1 1 0 1 1 0 -1 1 1 -1
  [4,16,1,1,1,1,0,1,1,0,-1,1,1,-1],
];
module ldraw_lib__box5(step=0, col=false, unit=2/5, alt=false, line=0.2, solid=!$preview)
    makepoly(ldraw_lib__box5(solid), step=step, col=col, unit=unit, alt=alt, line=line, solid=solid);
ldraw_lib__box5(line=0.2);
// file: ../p/box4t.scad
use <../lib.scad>
$fa=1; $fs=0.2;
function ldraw_lib__box4t(realsolid=false) = [
// 0 Box with 4 Adjacent Faces and All Edges
// 0 Name: box4t.dat
// 0 Author: Tore Eriksson [Tore_Eriksson]
// 0 !LDRAW_ORG Primitive UPDATE 2003-02
// 0 !LICENSE Licensed under CC BY 2.0 and CC BY 4.0 : see CAreadme.txt
// 
// 0 BFC CERTIFY CCW
  [0,"BFC","CERTIFY"],
  [0,"BFC","CCW"],
// 
// 0 !HISTORY 1997-09-29 [PTadmin] Official Update 1997-15
// 0 !HISTORY 2002-08-31 [izanette] Modified with WINDZ for BFC compliance
// 0 !HISTORY 2003-08-01 [PTadmin] Official Update 2003-02
// 0 !HISTORY 2007-06-24 [PTadmin] Header formatted for Contributor Agreement
// 0 !HISTORY 2008-07-01 [PTadmin] Official Update 2008-01
// 
// 
// 2 24 1 1 1 -1 1 1
  [2,24,1,1,1,-1,1,1],
// 2 24 -1 1 1 -1 1 -1
  [2,24,-1,1,1,-1,1,-1],
// 2 24 -1 1 -1 1 1 -1
  [2,24,-1,1,-1,1,1,-1],
// 2 24 1 1 -1 1 1 1
  [2,24,1,1,-1,1,1,1],
// 2 24 1 0 1 -1 0 1
  [2,24,1,0,1,-1,0,1],
// 2 24 -1 0 1 -1 0 -1
  [2,24,-1,0,1,-1,0,-1],
// 2 24 -1 0 -1 1 0 -1
  [2,24,-1,0,-1,1,0,-1],
// 2 24 1 0 -1 1 0 1
  [2,24,1,0,-1,1,0,1],
// 2 24 1 0 1 1 1 1
  [2,24,1,0,1,1,1,1],
// 2 24 -1 0 1 -1 1 1
  [2,24,-1,0,1,-1,1,1],
// 2 24 1 0 -1 1 1 -1
  [2,24,1,0,-1,1,1,-1],
// 2 24 -1 0 -1 -1 1 -1
  [2,24,-1,0,-1,-1,1,-1],
// 4 16 1 1 1 1 1 -1 -1 1 -1 -1 1 1
  [4,16,1,1,1,1,1,-1,-1,1,-1,-1,1,1],
// 4 16 1 1 1 -1 1 1 -1 0 1 1 0 1
  [4,16,1,1,1,-1,1,1,-1,0,1,1,0,1],
// 4 16 -1 1 1 -1 1 -1 -1 0 -1 -1 0 1
  [4,16,-1,1,1,-1,1,-1,-1,0,-1,-1,0,1],
// 0 4 16 -1 1 -1 -1 0 -1 1 0 -1 1 1 -1
// 4 16 1 1 -1 1 1 1 1 0 1 1 0 -1
  [4,16,1,1,-1,1,1,1,1,0,1,1,0,-1],
// 0
];
module ldraw_lib__box4t(step=0, col=false, unit=2/5, alt=false, line=0.2, solid=!$preview)
    makepoly(ldraw_lib__box4t(solid), step=step, col=col, unit=unit, alt=alt, line=line, solid=solid);
ldraw_lib__box4t(line=0.2);
// file: 3004.scad
use <../lib.scad>
use <s/3004s01.scad>
$fa=1; $fs=0.2;
function ldraw_lib__3004(realsolid=false) = [
// 0 Brick  1 x  2
// 0 Name: 3004.dat
// 0 Author: James Jessiman
// 0 !LDRAW_ORG Part UPDATE 2022-05
// 0 !LICENSE Licensed under CC BY 2.0 and CC BY 4.0 : see CAreadme.txt
// 
// 0 BFC CERTIFY CCW
  [0,"BFC","CERTIFY"],
  [0,"BFC","CCW"],
// 
// 0 !HISTORY 2001-10-26 [PTadmin] Official Update 2001-01
// 0 !HISTORY 2002-05-07 {unknown} BFC Certification
// 0 !HISTORY 2002-06-11 [PTadmin] Official Update 2002-03
// 0 !HISTORY 2007-05-07 [PTadmin] Header formatted for Contributor Agreement
// 0 !HISTORY 2008-07-01 [PTadmin] Official Update 2008-01
// 0 !HISTORY 2022-08-04 [MagFors] Using subfile
// 0 !HISTORY 2022-09-15 [PTadmin] Official Update 2022-05
// 
// 
// 1 16 0 0 0 1 0 0 0 1 0 0 0 1 s\3004s01.dat
  [1,16,0,0,0,1,0,0,0,1,0,0,0,1, ldraw_lib__s__3004s01(realsolid)],
// 4 16 -20 24 -10 20 24 -10 20 0 -10 -20 0 -10
  [4,16,-20,24,-10,20,24,-10,20,0,-10,-20,0,-10],
];
module ldraw_lib__3004(step=0, col=false, unit=2/5, alt=false, line=0.2, solid=!$preview)
    makepoly(ldraw_lib__3004(solid), step=step, col=col, unit=unit, alt=alt, line=line, solid=solid);
ldraw_lib__3004(line=0.2);
// file: s/3005s01.scad
use <../../lib.scad>
use <../../p/box4t.scad>
use <../../p/box5.scad>
use <../../p/stud.scad>
$fa=1; $fs=0.2;
function ldraw_lib__s__3005s01(realsolid=false) = [
// 0 ~Brick  1 x  1 without Front Face
// 0 Name: s\3005s01.dat
// 0 Author: John Riley [jriley]
// 0 !LDRAW_ORG Subpart UPDATE 2004-01
// 0 !LICENSE Licensed under CC BY 2.0 and CC BY 4.0 : see CAreadme.txt
// 
// 0 BFC CERTIFY CCW
  [0,"BFC","CERTIFY"],
  [0,"BFC","CCW"],
// 
// 0 !HISTORY 2003-09-07 [jriley] BFCed & Subfiled
// 0 !HISTORY 2004-03-02 [PTadmin] Official Update 2004-01
// 0 !HISTORY 2007-08-29 [PTadmin] Header formatted for Contributor Agreement
// 0 !HISTORY 2008-07-01 [PTadmin] Official Update 2008-01
// 
// 
// 0 BFC INVERTNEXT
  [0,"BFC","INVERTNEXT"],
// 1 16 0 24 0 0 0 6 0 -20 0 -6 0 0 box5.dat
  [1,16,0,24,0,0,0,6,0,-20,0,-6,0,0, ldraw_lib__box5(realsolid)],
// 4 16 10 24 -10 6 24 -6 6 24 6 10 24 10
  [4,16,10,24,-10,6,24,-6,6,24,6,10,24,10],
// 4 16 10 24 10 6 24 6 -6 24 6 -10 24 10
  [4,16,10,24,10,6,24,6,-6,24,6,-10,24,10],
// 4 16 -10 24 10 -6 24 6 -6 24 -6 -10 24 -10
  [4,16,-10,24,10,-6,24,6,-6,24,-6,-10,24,-10],
// 4 16 -10 24 -10 -6 24 -6 6 24 -6 10 24 -10
  [4,16,-10,24,-10,-6,24,-6,6,24,-6,10,24,-10],
// 1 16 0 24 0 10 0 0 0 -24 0 0 0 10 box4t.dat
  [1,16,0,24,0,10,0,0,0,-24,0,0,0,10, ldraw_lib__box4t(realsolid)],
// 1 16 0 0 0 0 0 1 0 1 0 -1 0 0 stud.dat
  [1,16,0,0,0,0,0,1,0,1,0,-1,0,0, ldraw_lib__stud(realsolid)],
// 0
];
module ldraw_lib__s__3005s01(step=0, col=false, unit=2/5, alt=false, line=0.2, solid=!$preview)
    makepoly(ldraw_lib__s__3005s01(solid), step=step, col=col, unit=unit, alt=alt, line=line, solid=solid);
ldraw_lib__s__3005s01(line=0.2);
// main file
use <../lib.scad>
use <s/3005s01.scad>
$fa=1; $fs=0.2;
function ldraw_lib__3005pva(realsolid=false) = [
// 0 Brick  1 x  1 with Lightblue "A" Pattern
// 0 Name: 3005pva.dat
// 0 Author: Tore Eriksson [Tore_Eriksson]
// 0 !LDRAW_ORG Part UPDATE 2004-02
// 0 !LICENSE Licensed under CC BY 2.0 and CC BY 4.0 : see CAreadme.txt
// 
// 0 BFC CERTIFY CW
  [0,"BFC","CERTIFY"],
  [0,"BFC","CW"],
// 
// 0 !KEYWORDS letters numbers
// 
// 0 !HISTORY 2004-04-22 [PTadmin] Official Update 2004-02
// 0 !HISTORY 2007-05-11 [PTadmin] Header formatted for Contributor Agreement
// 0 !HISTORY 2008-07-01 [PTadmin] Official Update 2008-01
// 
// 
// 1 16 0 0 0 1 0 0 0 1 0 0 0 1 s\3005s01.dat
  [1,16,0,0,0,1,0,0,0,1,0,0,0,1, ldraw_lib__s__3005s01(realsolid)],
// 
// 3 9 -2 6 -10 2 6 -10 0 10.2 -10
  [3,9,-2,6,-10,2,6,-10,0,10.2,-10],
// 3 9 2 6 -10 1.1357 14 -10 0 10.2 -10
  [3,9,2,6,-10,1.1357,14,-10,0,10.2,-10],
// 3 9 -2 6 -10 0 10.2 -10 -1.1357 14 -10
  [3,9,-2,6,-10,0,10.2,-10,-1.1357,14,-10],
// 4 9 2 6 -10 7 20 -10 2.429 17 -10 1.1357 14 -10
  [4,9,2,6,-10,7,20,-10,2.429,17,-10,1.1357,14,-10],
// 4 9 -2 6 -10 -1.1357 14 -10 -2.429 17 -10 -7 20 -10
  [4,9,-2,6,-10,-1.1357,14,-10,-2.429,17,-10,-7,20,-10],
// 3 9 7 20 -10 3.5 20 -10 2.429 17 -10
  [3,9,7,20,-10,3.5,20,-10,2.429,17,-10],
// 3 9 -7 20 -10 -2.429 17 -10 -3.5 20 -10
  [3,9,-7,20,-10,-2.429,17,-10,-3.5,20,-10],
// 4 9 -1.1357 14 -10 1.1357 14 -10 2.429 17 -10 -2.429 17 -10
  [4,9,-1.1357,14,-10,1.1357,14,-10,2.429,17,-10,-2.429,17,-10],
// 3 16 0 10.2 -10 1.1357 14 -10 -1.1357 14 -10
  [3,16,0,10.2,-10,1.1357,14,-10,-1.1357,14,-10],
// 4 16 10 24 -10 7 20 -10 2 6 -10 10 0 -10
  [4,16,10,24,-10,7,20,-10,2,6,-10,10,0,-10],
// 4 16 -10 24 -10 -7 20 -10 7 20 -10 10 24 -10
  [4,16,-10,24,-10,-7,20,-10,7,20,-10,10,24,-10],
// 4 16 -10 0 -10 -2 6 -10 -7 20 -10 -10 24 -10
  [4,16,-10,0,-10,-2,6,-10,-7,20,-10,-10,24,-10],
// 4 16 -10 0 -10 10 0 -10 2 6 -10 -2 6 -10
  [4,16,-10,0,-10,10,0,-10,2,6,-10,-2,6,-10],
// 4 16 -2.429 17 -10 2.429 17 -10 3.5 20 -10 -3.5 20 -10
  [4,16,-2.429,17,-10,2.429,17,-10,3.5,20,-10,-3.5,20,-10],
// 0
];
module ldraw_lib__3005pva(step=0, col=false, unit=2/5, alt=false, line=0.2, solid=!$preview)
    makepoly(ldraw_lib__3005pva(solid), step=step, col=col, unit=unit, alt=alt, line=line, solid=solid);
ldraw_lib__3005pva(line=0.2);
